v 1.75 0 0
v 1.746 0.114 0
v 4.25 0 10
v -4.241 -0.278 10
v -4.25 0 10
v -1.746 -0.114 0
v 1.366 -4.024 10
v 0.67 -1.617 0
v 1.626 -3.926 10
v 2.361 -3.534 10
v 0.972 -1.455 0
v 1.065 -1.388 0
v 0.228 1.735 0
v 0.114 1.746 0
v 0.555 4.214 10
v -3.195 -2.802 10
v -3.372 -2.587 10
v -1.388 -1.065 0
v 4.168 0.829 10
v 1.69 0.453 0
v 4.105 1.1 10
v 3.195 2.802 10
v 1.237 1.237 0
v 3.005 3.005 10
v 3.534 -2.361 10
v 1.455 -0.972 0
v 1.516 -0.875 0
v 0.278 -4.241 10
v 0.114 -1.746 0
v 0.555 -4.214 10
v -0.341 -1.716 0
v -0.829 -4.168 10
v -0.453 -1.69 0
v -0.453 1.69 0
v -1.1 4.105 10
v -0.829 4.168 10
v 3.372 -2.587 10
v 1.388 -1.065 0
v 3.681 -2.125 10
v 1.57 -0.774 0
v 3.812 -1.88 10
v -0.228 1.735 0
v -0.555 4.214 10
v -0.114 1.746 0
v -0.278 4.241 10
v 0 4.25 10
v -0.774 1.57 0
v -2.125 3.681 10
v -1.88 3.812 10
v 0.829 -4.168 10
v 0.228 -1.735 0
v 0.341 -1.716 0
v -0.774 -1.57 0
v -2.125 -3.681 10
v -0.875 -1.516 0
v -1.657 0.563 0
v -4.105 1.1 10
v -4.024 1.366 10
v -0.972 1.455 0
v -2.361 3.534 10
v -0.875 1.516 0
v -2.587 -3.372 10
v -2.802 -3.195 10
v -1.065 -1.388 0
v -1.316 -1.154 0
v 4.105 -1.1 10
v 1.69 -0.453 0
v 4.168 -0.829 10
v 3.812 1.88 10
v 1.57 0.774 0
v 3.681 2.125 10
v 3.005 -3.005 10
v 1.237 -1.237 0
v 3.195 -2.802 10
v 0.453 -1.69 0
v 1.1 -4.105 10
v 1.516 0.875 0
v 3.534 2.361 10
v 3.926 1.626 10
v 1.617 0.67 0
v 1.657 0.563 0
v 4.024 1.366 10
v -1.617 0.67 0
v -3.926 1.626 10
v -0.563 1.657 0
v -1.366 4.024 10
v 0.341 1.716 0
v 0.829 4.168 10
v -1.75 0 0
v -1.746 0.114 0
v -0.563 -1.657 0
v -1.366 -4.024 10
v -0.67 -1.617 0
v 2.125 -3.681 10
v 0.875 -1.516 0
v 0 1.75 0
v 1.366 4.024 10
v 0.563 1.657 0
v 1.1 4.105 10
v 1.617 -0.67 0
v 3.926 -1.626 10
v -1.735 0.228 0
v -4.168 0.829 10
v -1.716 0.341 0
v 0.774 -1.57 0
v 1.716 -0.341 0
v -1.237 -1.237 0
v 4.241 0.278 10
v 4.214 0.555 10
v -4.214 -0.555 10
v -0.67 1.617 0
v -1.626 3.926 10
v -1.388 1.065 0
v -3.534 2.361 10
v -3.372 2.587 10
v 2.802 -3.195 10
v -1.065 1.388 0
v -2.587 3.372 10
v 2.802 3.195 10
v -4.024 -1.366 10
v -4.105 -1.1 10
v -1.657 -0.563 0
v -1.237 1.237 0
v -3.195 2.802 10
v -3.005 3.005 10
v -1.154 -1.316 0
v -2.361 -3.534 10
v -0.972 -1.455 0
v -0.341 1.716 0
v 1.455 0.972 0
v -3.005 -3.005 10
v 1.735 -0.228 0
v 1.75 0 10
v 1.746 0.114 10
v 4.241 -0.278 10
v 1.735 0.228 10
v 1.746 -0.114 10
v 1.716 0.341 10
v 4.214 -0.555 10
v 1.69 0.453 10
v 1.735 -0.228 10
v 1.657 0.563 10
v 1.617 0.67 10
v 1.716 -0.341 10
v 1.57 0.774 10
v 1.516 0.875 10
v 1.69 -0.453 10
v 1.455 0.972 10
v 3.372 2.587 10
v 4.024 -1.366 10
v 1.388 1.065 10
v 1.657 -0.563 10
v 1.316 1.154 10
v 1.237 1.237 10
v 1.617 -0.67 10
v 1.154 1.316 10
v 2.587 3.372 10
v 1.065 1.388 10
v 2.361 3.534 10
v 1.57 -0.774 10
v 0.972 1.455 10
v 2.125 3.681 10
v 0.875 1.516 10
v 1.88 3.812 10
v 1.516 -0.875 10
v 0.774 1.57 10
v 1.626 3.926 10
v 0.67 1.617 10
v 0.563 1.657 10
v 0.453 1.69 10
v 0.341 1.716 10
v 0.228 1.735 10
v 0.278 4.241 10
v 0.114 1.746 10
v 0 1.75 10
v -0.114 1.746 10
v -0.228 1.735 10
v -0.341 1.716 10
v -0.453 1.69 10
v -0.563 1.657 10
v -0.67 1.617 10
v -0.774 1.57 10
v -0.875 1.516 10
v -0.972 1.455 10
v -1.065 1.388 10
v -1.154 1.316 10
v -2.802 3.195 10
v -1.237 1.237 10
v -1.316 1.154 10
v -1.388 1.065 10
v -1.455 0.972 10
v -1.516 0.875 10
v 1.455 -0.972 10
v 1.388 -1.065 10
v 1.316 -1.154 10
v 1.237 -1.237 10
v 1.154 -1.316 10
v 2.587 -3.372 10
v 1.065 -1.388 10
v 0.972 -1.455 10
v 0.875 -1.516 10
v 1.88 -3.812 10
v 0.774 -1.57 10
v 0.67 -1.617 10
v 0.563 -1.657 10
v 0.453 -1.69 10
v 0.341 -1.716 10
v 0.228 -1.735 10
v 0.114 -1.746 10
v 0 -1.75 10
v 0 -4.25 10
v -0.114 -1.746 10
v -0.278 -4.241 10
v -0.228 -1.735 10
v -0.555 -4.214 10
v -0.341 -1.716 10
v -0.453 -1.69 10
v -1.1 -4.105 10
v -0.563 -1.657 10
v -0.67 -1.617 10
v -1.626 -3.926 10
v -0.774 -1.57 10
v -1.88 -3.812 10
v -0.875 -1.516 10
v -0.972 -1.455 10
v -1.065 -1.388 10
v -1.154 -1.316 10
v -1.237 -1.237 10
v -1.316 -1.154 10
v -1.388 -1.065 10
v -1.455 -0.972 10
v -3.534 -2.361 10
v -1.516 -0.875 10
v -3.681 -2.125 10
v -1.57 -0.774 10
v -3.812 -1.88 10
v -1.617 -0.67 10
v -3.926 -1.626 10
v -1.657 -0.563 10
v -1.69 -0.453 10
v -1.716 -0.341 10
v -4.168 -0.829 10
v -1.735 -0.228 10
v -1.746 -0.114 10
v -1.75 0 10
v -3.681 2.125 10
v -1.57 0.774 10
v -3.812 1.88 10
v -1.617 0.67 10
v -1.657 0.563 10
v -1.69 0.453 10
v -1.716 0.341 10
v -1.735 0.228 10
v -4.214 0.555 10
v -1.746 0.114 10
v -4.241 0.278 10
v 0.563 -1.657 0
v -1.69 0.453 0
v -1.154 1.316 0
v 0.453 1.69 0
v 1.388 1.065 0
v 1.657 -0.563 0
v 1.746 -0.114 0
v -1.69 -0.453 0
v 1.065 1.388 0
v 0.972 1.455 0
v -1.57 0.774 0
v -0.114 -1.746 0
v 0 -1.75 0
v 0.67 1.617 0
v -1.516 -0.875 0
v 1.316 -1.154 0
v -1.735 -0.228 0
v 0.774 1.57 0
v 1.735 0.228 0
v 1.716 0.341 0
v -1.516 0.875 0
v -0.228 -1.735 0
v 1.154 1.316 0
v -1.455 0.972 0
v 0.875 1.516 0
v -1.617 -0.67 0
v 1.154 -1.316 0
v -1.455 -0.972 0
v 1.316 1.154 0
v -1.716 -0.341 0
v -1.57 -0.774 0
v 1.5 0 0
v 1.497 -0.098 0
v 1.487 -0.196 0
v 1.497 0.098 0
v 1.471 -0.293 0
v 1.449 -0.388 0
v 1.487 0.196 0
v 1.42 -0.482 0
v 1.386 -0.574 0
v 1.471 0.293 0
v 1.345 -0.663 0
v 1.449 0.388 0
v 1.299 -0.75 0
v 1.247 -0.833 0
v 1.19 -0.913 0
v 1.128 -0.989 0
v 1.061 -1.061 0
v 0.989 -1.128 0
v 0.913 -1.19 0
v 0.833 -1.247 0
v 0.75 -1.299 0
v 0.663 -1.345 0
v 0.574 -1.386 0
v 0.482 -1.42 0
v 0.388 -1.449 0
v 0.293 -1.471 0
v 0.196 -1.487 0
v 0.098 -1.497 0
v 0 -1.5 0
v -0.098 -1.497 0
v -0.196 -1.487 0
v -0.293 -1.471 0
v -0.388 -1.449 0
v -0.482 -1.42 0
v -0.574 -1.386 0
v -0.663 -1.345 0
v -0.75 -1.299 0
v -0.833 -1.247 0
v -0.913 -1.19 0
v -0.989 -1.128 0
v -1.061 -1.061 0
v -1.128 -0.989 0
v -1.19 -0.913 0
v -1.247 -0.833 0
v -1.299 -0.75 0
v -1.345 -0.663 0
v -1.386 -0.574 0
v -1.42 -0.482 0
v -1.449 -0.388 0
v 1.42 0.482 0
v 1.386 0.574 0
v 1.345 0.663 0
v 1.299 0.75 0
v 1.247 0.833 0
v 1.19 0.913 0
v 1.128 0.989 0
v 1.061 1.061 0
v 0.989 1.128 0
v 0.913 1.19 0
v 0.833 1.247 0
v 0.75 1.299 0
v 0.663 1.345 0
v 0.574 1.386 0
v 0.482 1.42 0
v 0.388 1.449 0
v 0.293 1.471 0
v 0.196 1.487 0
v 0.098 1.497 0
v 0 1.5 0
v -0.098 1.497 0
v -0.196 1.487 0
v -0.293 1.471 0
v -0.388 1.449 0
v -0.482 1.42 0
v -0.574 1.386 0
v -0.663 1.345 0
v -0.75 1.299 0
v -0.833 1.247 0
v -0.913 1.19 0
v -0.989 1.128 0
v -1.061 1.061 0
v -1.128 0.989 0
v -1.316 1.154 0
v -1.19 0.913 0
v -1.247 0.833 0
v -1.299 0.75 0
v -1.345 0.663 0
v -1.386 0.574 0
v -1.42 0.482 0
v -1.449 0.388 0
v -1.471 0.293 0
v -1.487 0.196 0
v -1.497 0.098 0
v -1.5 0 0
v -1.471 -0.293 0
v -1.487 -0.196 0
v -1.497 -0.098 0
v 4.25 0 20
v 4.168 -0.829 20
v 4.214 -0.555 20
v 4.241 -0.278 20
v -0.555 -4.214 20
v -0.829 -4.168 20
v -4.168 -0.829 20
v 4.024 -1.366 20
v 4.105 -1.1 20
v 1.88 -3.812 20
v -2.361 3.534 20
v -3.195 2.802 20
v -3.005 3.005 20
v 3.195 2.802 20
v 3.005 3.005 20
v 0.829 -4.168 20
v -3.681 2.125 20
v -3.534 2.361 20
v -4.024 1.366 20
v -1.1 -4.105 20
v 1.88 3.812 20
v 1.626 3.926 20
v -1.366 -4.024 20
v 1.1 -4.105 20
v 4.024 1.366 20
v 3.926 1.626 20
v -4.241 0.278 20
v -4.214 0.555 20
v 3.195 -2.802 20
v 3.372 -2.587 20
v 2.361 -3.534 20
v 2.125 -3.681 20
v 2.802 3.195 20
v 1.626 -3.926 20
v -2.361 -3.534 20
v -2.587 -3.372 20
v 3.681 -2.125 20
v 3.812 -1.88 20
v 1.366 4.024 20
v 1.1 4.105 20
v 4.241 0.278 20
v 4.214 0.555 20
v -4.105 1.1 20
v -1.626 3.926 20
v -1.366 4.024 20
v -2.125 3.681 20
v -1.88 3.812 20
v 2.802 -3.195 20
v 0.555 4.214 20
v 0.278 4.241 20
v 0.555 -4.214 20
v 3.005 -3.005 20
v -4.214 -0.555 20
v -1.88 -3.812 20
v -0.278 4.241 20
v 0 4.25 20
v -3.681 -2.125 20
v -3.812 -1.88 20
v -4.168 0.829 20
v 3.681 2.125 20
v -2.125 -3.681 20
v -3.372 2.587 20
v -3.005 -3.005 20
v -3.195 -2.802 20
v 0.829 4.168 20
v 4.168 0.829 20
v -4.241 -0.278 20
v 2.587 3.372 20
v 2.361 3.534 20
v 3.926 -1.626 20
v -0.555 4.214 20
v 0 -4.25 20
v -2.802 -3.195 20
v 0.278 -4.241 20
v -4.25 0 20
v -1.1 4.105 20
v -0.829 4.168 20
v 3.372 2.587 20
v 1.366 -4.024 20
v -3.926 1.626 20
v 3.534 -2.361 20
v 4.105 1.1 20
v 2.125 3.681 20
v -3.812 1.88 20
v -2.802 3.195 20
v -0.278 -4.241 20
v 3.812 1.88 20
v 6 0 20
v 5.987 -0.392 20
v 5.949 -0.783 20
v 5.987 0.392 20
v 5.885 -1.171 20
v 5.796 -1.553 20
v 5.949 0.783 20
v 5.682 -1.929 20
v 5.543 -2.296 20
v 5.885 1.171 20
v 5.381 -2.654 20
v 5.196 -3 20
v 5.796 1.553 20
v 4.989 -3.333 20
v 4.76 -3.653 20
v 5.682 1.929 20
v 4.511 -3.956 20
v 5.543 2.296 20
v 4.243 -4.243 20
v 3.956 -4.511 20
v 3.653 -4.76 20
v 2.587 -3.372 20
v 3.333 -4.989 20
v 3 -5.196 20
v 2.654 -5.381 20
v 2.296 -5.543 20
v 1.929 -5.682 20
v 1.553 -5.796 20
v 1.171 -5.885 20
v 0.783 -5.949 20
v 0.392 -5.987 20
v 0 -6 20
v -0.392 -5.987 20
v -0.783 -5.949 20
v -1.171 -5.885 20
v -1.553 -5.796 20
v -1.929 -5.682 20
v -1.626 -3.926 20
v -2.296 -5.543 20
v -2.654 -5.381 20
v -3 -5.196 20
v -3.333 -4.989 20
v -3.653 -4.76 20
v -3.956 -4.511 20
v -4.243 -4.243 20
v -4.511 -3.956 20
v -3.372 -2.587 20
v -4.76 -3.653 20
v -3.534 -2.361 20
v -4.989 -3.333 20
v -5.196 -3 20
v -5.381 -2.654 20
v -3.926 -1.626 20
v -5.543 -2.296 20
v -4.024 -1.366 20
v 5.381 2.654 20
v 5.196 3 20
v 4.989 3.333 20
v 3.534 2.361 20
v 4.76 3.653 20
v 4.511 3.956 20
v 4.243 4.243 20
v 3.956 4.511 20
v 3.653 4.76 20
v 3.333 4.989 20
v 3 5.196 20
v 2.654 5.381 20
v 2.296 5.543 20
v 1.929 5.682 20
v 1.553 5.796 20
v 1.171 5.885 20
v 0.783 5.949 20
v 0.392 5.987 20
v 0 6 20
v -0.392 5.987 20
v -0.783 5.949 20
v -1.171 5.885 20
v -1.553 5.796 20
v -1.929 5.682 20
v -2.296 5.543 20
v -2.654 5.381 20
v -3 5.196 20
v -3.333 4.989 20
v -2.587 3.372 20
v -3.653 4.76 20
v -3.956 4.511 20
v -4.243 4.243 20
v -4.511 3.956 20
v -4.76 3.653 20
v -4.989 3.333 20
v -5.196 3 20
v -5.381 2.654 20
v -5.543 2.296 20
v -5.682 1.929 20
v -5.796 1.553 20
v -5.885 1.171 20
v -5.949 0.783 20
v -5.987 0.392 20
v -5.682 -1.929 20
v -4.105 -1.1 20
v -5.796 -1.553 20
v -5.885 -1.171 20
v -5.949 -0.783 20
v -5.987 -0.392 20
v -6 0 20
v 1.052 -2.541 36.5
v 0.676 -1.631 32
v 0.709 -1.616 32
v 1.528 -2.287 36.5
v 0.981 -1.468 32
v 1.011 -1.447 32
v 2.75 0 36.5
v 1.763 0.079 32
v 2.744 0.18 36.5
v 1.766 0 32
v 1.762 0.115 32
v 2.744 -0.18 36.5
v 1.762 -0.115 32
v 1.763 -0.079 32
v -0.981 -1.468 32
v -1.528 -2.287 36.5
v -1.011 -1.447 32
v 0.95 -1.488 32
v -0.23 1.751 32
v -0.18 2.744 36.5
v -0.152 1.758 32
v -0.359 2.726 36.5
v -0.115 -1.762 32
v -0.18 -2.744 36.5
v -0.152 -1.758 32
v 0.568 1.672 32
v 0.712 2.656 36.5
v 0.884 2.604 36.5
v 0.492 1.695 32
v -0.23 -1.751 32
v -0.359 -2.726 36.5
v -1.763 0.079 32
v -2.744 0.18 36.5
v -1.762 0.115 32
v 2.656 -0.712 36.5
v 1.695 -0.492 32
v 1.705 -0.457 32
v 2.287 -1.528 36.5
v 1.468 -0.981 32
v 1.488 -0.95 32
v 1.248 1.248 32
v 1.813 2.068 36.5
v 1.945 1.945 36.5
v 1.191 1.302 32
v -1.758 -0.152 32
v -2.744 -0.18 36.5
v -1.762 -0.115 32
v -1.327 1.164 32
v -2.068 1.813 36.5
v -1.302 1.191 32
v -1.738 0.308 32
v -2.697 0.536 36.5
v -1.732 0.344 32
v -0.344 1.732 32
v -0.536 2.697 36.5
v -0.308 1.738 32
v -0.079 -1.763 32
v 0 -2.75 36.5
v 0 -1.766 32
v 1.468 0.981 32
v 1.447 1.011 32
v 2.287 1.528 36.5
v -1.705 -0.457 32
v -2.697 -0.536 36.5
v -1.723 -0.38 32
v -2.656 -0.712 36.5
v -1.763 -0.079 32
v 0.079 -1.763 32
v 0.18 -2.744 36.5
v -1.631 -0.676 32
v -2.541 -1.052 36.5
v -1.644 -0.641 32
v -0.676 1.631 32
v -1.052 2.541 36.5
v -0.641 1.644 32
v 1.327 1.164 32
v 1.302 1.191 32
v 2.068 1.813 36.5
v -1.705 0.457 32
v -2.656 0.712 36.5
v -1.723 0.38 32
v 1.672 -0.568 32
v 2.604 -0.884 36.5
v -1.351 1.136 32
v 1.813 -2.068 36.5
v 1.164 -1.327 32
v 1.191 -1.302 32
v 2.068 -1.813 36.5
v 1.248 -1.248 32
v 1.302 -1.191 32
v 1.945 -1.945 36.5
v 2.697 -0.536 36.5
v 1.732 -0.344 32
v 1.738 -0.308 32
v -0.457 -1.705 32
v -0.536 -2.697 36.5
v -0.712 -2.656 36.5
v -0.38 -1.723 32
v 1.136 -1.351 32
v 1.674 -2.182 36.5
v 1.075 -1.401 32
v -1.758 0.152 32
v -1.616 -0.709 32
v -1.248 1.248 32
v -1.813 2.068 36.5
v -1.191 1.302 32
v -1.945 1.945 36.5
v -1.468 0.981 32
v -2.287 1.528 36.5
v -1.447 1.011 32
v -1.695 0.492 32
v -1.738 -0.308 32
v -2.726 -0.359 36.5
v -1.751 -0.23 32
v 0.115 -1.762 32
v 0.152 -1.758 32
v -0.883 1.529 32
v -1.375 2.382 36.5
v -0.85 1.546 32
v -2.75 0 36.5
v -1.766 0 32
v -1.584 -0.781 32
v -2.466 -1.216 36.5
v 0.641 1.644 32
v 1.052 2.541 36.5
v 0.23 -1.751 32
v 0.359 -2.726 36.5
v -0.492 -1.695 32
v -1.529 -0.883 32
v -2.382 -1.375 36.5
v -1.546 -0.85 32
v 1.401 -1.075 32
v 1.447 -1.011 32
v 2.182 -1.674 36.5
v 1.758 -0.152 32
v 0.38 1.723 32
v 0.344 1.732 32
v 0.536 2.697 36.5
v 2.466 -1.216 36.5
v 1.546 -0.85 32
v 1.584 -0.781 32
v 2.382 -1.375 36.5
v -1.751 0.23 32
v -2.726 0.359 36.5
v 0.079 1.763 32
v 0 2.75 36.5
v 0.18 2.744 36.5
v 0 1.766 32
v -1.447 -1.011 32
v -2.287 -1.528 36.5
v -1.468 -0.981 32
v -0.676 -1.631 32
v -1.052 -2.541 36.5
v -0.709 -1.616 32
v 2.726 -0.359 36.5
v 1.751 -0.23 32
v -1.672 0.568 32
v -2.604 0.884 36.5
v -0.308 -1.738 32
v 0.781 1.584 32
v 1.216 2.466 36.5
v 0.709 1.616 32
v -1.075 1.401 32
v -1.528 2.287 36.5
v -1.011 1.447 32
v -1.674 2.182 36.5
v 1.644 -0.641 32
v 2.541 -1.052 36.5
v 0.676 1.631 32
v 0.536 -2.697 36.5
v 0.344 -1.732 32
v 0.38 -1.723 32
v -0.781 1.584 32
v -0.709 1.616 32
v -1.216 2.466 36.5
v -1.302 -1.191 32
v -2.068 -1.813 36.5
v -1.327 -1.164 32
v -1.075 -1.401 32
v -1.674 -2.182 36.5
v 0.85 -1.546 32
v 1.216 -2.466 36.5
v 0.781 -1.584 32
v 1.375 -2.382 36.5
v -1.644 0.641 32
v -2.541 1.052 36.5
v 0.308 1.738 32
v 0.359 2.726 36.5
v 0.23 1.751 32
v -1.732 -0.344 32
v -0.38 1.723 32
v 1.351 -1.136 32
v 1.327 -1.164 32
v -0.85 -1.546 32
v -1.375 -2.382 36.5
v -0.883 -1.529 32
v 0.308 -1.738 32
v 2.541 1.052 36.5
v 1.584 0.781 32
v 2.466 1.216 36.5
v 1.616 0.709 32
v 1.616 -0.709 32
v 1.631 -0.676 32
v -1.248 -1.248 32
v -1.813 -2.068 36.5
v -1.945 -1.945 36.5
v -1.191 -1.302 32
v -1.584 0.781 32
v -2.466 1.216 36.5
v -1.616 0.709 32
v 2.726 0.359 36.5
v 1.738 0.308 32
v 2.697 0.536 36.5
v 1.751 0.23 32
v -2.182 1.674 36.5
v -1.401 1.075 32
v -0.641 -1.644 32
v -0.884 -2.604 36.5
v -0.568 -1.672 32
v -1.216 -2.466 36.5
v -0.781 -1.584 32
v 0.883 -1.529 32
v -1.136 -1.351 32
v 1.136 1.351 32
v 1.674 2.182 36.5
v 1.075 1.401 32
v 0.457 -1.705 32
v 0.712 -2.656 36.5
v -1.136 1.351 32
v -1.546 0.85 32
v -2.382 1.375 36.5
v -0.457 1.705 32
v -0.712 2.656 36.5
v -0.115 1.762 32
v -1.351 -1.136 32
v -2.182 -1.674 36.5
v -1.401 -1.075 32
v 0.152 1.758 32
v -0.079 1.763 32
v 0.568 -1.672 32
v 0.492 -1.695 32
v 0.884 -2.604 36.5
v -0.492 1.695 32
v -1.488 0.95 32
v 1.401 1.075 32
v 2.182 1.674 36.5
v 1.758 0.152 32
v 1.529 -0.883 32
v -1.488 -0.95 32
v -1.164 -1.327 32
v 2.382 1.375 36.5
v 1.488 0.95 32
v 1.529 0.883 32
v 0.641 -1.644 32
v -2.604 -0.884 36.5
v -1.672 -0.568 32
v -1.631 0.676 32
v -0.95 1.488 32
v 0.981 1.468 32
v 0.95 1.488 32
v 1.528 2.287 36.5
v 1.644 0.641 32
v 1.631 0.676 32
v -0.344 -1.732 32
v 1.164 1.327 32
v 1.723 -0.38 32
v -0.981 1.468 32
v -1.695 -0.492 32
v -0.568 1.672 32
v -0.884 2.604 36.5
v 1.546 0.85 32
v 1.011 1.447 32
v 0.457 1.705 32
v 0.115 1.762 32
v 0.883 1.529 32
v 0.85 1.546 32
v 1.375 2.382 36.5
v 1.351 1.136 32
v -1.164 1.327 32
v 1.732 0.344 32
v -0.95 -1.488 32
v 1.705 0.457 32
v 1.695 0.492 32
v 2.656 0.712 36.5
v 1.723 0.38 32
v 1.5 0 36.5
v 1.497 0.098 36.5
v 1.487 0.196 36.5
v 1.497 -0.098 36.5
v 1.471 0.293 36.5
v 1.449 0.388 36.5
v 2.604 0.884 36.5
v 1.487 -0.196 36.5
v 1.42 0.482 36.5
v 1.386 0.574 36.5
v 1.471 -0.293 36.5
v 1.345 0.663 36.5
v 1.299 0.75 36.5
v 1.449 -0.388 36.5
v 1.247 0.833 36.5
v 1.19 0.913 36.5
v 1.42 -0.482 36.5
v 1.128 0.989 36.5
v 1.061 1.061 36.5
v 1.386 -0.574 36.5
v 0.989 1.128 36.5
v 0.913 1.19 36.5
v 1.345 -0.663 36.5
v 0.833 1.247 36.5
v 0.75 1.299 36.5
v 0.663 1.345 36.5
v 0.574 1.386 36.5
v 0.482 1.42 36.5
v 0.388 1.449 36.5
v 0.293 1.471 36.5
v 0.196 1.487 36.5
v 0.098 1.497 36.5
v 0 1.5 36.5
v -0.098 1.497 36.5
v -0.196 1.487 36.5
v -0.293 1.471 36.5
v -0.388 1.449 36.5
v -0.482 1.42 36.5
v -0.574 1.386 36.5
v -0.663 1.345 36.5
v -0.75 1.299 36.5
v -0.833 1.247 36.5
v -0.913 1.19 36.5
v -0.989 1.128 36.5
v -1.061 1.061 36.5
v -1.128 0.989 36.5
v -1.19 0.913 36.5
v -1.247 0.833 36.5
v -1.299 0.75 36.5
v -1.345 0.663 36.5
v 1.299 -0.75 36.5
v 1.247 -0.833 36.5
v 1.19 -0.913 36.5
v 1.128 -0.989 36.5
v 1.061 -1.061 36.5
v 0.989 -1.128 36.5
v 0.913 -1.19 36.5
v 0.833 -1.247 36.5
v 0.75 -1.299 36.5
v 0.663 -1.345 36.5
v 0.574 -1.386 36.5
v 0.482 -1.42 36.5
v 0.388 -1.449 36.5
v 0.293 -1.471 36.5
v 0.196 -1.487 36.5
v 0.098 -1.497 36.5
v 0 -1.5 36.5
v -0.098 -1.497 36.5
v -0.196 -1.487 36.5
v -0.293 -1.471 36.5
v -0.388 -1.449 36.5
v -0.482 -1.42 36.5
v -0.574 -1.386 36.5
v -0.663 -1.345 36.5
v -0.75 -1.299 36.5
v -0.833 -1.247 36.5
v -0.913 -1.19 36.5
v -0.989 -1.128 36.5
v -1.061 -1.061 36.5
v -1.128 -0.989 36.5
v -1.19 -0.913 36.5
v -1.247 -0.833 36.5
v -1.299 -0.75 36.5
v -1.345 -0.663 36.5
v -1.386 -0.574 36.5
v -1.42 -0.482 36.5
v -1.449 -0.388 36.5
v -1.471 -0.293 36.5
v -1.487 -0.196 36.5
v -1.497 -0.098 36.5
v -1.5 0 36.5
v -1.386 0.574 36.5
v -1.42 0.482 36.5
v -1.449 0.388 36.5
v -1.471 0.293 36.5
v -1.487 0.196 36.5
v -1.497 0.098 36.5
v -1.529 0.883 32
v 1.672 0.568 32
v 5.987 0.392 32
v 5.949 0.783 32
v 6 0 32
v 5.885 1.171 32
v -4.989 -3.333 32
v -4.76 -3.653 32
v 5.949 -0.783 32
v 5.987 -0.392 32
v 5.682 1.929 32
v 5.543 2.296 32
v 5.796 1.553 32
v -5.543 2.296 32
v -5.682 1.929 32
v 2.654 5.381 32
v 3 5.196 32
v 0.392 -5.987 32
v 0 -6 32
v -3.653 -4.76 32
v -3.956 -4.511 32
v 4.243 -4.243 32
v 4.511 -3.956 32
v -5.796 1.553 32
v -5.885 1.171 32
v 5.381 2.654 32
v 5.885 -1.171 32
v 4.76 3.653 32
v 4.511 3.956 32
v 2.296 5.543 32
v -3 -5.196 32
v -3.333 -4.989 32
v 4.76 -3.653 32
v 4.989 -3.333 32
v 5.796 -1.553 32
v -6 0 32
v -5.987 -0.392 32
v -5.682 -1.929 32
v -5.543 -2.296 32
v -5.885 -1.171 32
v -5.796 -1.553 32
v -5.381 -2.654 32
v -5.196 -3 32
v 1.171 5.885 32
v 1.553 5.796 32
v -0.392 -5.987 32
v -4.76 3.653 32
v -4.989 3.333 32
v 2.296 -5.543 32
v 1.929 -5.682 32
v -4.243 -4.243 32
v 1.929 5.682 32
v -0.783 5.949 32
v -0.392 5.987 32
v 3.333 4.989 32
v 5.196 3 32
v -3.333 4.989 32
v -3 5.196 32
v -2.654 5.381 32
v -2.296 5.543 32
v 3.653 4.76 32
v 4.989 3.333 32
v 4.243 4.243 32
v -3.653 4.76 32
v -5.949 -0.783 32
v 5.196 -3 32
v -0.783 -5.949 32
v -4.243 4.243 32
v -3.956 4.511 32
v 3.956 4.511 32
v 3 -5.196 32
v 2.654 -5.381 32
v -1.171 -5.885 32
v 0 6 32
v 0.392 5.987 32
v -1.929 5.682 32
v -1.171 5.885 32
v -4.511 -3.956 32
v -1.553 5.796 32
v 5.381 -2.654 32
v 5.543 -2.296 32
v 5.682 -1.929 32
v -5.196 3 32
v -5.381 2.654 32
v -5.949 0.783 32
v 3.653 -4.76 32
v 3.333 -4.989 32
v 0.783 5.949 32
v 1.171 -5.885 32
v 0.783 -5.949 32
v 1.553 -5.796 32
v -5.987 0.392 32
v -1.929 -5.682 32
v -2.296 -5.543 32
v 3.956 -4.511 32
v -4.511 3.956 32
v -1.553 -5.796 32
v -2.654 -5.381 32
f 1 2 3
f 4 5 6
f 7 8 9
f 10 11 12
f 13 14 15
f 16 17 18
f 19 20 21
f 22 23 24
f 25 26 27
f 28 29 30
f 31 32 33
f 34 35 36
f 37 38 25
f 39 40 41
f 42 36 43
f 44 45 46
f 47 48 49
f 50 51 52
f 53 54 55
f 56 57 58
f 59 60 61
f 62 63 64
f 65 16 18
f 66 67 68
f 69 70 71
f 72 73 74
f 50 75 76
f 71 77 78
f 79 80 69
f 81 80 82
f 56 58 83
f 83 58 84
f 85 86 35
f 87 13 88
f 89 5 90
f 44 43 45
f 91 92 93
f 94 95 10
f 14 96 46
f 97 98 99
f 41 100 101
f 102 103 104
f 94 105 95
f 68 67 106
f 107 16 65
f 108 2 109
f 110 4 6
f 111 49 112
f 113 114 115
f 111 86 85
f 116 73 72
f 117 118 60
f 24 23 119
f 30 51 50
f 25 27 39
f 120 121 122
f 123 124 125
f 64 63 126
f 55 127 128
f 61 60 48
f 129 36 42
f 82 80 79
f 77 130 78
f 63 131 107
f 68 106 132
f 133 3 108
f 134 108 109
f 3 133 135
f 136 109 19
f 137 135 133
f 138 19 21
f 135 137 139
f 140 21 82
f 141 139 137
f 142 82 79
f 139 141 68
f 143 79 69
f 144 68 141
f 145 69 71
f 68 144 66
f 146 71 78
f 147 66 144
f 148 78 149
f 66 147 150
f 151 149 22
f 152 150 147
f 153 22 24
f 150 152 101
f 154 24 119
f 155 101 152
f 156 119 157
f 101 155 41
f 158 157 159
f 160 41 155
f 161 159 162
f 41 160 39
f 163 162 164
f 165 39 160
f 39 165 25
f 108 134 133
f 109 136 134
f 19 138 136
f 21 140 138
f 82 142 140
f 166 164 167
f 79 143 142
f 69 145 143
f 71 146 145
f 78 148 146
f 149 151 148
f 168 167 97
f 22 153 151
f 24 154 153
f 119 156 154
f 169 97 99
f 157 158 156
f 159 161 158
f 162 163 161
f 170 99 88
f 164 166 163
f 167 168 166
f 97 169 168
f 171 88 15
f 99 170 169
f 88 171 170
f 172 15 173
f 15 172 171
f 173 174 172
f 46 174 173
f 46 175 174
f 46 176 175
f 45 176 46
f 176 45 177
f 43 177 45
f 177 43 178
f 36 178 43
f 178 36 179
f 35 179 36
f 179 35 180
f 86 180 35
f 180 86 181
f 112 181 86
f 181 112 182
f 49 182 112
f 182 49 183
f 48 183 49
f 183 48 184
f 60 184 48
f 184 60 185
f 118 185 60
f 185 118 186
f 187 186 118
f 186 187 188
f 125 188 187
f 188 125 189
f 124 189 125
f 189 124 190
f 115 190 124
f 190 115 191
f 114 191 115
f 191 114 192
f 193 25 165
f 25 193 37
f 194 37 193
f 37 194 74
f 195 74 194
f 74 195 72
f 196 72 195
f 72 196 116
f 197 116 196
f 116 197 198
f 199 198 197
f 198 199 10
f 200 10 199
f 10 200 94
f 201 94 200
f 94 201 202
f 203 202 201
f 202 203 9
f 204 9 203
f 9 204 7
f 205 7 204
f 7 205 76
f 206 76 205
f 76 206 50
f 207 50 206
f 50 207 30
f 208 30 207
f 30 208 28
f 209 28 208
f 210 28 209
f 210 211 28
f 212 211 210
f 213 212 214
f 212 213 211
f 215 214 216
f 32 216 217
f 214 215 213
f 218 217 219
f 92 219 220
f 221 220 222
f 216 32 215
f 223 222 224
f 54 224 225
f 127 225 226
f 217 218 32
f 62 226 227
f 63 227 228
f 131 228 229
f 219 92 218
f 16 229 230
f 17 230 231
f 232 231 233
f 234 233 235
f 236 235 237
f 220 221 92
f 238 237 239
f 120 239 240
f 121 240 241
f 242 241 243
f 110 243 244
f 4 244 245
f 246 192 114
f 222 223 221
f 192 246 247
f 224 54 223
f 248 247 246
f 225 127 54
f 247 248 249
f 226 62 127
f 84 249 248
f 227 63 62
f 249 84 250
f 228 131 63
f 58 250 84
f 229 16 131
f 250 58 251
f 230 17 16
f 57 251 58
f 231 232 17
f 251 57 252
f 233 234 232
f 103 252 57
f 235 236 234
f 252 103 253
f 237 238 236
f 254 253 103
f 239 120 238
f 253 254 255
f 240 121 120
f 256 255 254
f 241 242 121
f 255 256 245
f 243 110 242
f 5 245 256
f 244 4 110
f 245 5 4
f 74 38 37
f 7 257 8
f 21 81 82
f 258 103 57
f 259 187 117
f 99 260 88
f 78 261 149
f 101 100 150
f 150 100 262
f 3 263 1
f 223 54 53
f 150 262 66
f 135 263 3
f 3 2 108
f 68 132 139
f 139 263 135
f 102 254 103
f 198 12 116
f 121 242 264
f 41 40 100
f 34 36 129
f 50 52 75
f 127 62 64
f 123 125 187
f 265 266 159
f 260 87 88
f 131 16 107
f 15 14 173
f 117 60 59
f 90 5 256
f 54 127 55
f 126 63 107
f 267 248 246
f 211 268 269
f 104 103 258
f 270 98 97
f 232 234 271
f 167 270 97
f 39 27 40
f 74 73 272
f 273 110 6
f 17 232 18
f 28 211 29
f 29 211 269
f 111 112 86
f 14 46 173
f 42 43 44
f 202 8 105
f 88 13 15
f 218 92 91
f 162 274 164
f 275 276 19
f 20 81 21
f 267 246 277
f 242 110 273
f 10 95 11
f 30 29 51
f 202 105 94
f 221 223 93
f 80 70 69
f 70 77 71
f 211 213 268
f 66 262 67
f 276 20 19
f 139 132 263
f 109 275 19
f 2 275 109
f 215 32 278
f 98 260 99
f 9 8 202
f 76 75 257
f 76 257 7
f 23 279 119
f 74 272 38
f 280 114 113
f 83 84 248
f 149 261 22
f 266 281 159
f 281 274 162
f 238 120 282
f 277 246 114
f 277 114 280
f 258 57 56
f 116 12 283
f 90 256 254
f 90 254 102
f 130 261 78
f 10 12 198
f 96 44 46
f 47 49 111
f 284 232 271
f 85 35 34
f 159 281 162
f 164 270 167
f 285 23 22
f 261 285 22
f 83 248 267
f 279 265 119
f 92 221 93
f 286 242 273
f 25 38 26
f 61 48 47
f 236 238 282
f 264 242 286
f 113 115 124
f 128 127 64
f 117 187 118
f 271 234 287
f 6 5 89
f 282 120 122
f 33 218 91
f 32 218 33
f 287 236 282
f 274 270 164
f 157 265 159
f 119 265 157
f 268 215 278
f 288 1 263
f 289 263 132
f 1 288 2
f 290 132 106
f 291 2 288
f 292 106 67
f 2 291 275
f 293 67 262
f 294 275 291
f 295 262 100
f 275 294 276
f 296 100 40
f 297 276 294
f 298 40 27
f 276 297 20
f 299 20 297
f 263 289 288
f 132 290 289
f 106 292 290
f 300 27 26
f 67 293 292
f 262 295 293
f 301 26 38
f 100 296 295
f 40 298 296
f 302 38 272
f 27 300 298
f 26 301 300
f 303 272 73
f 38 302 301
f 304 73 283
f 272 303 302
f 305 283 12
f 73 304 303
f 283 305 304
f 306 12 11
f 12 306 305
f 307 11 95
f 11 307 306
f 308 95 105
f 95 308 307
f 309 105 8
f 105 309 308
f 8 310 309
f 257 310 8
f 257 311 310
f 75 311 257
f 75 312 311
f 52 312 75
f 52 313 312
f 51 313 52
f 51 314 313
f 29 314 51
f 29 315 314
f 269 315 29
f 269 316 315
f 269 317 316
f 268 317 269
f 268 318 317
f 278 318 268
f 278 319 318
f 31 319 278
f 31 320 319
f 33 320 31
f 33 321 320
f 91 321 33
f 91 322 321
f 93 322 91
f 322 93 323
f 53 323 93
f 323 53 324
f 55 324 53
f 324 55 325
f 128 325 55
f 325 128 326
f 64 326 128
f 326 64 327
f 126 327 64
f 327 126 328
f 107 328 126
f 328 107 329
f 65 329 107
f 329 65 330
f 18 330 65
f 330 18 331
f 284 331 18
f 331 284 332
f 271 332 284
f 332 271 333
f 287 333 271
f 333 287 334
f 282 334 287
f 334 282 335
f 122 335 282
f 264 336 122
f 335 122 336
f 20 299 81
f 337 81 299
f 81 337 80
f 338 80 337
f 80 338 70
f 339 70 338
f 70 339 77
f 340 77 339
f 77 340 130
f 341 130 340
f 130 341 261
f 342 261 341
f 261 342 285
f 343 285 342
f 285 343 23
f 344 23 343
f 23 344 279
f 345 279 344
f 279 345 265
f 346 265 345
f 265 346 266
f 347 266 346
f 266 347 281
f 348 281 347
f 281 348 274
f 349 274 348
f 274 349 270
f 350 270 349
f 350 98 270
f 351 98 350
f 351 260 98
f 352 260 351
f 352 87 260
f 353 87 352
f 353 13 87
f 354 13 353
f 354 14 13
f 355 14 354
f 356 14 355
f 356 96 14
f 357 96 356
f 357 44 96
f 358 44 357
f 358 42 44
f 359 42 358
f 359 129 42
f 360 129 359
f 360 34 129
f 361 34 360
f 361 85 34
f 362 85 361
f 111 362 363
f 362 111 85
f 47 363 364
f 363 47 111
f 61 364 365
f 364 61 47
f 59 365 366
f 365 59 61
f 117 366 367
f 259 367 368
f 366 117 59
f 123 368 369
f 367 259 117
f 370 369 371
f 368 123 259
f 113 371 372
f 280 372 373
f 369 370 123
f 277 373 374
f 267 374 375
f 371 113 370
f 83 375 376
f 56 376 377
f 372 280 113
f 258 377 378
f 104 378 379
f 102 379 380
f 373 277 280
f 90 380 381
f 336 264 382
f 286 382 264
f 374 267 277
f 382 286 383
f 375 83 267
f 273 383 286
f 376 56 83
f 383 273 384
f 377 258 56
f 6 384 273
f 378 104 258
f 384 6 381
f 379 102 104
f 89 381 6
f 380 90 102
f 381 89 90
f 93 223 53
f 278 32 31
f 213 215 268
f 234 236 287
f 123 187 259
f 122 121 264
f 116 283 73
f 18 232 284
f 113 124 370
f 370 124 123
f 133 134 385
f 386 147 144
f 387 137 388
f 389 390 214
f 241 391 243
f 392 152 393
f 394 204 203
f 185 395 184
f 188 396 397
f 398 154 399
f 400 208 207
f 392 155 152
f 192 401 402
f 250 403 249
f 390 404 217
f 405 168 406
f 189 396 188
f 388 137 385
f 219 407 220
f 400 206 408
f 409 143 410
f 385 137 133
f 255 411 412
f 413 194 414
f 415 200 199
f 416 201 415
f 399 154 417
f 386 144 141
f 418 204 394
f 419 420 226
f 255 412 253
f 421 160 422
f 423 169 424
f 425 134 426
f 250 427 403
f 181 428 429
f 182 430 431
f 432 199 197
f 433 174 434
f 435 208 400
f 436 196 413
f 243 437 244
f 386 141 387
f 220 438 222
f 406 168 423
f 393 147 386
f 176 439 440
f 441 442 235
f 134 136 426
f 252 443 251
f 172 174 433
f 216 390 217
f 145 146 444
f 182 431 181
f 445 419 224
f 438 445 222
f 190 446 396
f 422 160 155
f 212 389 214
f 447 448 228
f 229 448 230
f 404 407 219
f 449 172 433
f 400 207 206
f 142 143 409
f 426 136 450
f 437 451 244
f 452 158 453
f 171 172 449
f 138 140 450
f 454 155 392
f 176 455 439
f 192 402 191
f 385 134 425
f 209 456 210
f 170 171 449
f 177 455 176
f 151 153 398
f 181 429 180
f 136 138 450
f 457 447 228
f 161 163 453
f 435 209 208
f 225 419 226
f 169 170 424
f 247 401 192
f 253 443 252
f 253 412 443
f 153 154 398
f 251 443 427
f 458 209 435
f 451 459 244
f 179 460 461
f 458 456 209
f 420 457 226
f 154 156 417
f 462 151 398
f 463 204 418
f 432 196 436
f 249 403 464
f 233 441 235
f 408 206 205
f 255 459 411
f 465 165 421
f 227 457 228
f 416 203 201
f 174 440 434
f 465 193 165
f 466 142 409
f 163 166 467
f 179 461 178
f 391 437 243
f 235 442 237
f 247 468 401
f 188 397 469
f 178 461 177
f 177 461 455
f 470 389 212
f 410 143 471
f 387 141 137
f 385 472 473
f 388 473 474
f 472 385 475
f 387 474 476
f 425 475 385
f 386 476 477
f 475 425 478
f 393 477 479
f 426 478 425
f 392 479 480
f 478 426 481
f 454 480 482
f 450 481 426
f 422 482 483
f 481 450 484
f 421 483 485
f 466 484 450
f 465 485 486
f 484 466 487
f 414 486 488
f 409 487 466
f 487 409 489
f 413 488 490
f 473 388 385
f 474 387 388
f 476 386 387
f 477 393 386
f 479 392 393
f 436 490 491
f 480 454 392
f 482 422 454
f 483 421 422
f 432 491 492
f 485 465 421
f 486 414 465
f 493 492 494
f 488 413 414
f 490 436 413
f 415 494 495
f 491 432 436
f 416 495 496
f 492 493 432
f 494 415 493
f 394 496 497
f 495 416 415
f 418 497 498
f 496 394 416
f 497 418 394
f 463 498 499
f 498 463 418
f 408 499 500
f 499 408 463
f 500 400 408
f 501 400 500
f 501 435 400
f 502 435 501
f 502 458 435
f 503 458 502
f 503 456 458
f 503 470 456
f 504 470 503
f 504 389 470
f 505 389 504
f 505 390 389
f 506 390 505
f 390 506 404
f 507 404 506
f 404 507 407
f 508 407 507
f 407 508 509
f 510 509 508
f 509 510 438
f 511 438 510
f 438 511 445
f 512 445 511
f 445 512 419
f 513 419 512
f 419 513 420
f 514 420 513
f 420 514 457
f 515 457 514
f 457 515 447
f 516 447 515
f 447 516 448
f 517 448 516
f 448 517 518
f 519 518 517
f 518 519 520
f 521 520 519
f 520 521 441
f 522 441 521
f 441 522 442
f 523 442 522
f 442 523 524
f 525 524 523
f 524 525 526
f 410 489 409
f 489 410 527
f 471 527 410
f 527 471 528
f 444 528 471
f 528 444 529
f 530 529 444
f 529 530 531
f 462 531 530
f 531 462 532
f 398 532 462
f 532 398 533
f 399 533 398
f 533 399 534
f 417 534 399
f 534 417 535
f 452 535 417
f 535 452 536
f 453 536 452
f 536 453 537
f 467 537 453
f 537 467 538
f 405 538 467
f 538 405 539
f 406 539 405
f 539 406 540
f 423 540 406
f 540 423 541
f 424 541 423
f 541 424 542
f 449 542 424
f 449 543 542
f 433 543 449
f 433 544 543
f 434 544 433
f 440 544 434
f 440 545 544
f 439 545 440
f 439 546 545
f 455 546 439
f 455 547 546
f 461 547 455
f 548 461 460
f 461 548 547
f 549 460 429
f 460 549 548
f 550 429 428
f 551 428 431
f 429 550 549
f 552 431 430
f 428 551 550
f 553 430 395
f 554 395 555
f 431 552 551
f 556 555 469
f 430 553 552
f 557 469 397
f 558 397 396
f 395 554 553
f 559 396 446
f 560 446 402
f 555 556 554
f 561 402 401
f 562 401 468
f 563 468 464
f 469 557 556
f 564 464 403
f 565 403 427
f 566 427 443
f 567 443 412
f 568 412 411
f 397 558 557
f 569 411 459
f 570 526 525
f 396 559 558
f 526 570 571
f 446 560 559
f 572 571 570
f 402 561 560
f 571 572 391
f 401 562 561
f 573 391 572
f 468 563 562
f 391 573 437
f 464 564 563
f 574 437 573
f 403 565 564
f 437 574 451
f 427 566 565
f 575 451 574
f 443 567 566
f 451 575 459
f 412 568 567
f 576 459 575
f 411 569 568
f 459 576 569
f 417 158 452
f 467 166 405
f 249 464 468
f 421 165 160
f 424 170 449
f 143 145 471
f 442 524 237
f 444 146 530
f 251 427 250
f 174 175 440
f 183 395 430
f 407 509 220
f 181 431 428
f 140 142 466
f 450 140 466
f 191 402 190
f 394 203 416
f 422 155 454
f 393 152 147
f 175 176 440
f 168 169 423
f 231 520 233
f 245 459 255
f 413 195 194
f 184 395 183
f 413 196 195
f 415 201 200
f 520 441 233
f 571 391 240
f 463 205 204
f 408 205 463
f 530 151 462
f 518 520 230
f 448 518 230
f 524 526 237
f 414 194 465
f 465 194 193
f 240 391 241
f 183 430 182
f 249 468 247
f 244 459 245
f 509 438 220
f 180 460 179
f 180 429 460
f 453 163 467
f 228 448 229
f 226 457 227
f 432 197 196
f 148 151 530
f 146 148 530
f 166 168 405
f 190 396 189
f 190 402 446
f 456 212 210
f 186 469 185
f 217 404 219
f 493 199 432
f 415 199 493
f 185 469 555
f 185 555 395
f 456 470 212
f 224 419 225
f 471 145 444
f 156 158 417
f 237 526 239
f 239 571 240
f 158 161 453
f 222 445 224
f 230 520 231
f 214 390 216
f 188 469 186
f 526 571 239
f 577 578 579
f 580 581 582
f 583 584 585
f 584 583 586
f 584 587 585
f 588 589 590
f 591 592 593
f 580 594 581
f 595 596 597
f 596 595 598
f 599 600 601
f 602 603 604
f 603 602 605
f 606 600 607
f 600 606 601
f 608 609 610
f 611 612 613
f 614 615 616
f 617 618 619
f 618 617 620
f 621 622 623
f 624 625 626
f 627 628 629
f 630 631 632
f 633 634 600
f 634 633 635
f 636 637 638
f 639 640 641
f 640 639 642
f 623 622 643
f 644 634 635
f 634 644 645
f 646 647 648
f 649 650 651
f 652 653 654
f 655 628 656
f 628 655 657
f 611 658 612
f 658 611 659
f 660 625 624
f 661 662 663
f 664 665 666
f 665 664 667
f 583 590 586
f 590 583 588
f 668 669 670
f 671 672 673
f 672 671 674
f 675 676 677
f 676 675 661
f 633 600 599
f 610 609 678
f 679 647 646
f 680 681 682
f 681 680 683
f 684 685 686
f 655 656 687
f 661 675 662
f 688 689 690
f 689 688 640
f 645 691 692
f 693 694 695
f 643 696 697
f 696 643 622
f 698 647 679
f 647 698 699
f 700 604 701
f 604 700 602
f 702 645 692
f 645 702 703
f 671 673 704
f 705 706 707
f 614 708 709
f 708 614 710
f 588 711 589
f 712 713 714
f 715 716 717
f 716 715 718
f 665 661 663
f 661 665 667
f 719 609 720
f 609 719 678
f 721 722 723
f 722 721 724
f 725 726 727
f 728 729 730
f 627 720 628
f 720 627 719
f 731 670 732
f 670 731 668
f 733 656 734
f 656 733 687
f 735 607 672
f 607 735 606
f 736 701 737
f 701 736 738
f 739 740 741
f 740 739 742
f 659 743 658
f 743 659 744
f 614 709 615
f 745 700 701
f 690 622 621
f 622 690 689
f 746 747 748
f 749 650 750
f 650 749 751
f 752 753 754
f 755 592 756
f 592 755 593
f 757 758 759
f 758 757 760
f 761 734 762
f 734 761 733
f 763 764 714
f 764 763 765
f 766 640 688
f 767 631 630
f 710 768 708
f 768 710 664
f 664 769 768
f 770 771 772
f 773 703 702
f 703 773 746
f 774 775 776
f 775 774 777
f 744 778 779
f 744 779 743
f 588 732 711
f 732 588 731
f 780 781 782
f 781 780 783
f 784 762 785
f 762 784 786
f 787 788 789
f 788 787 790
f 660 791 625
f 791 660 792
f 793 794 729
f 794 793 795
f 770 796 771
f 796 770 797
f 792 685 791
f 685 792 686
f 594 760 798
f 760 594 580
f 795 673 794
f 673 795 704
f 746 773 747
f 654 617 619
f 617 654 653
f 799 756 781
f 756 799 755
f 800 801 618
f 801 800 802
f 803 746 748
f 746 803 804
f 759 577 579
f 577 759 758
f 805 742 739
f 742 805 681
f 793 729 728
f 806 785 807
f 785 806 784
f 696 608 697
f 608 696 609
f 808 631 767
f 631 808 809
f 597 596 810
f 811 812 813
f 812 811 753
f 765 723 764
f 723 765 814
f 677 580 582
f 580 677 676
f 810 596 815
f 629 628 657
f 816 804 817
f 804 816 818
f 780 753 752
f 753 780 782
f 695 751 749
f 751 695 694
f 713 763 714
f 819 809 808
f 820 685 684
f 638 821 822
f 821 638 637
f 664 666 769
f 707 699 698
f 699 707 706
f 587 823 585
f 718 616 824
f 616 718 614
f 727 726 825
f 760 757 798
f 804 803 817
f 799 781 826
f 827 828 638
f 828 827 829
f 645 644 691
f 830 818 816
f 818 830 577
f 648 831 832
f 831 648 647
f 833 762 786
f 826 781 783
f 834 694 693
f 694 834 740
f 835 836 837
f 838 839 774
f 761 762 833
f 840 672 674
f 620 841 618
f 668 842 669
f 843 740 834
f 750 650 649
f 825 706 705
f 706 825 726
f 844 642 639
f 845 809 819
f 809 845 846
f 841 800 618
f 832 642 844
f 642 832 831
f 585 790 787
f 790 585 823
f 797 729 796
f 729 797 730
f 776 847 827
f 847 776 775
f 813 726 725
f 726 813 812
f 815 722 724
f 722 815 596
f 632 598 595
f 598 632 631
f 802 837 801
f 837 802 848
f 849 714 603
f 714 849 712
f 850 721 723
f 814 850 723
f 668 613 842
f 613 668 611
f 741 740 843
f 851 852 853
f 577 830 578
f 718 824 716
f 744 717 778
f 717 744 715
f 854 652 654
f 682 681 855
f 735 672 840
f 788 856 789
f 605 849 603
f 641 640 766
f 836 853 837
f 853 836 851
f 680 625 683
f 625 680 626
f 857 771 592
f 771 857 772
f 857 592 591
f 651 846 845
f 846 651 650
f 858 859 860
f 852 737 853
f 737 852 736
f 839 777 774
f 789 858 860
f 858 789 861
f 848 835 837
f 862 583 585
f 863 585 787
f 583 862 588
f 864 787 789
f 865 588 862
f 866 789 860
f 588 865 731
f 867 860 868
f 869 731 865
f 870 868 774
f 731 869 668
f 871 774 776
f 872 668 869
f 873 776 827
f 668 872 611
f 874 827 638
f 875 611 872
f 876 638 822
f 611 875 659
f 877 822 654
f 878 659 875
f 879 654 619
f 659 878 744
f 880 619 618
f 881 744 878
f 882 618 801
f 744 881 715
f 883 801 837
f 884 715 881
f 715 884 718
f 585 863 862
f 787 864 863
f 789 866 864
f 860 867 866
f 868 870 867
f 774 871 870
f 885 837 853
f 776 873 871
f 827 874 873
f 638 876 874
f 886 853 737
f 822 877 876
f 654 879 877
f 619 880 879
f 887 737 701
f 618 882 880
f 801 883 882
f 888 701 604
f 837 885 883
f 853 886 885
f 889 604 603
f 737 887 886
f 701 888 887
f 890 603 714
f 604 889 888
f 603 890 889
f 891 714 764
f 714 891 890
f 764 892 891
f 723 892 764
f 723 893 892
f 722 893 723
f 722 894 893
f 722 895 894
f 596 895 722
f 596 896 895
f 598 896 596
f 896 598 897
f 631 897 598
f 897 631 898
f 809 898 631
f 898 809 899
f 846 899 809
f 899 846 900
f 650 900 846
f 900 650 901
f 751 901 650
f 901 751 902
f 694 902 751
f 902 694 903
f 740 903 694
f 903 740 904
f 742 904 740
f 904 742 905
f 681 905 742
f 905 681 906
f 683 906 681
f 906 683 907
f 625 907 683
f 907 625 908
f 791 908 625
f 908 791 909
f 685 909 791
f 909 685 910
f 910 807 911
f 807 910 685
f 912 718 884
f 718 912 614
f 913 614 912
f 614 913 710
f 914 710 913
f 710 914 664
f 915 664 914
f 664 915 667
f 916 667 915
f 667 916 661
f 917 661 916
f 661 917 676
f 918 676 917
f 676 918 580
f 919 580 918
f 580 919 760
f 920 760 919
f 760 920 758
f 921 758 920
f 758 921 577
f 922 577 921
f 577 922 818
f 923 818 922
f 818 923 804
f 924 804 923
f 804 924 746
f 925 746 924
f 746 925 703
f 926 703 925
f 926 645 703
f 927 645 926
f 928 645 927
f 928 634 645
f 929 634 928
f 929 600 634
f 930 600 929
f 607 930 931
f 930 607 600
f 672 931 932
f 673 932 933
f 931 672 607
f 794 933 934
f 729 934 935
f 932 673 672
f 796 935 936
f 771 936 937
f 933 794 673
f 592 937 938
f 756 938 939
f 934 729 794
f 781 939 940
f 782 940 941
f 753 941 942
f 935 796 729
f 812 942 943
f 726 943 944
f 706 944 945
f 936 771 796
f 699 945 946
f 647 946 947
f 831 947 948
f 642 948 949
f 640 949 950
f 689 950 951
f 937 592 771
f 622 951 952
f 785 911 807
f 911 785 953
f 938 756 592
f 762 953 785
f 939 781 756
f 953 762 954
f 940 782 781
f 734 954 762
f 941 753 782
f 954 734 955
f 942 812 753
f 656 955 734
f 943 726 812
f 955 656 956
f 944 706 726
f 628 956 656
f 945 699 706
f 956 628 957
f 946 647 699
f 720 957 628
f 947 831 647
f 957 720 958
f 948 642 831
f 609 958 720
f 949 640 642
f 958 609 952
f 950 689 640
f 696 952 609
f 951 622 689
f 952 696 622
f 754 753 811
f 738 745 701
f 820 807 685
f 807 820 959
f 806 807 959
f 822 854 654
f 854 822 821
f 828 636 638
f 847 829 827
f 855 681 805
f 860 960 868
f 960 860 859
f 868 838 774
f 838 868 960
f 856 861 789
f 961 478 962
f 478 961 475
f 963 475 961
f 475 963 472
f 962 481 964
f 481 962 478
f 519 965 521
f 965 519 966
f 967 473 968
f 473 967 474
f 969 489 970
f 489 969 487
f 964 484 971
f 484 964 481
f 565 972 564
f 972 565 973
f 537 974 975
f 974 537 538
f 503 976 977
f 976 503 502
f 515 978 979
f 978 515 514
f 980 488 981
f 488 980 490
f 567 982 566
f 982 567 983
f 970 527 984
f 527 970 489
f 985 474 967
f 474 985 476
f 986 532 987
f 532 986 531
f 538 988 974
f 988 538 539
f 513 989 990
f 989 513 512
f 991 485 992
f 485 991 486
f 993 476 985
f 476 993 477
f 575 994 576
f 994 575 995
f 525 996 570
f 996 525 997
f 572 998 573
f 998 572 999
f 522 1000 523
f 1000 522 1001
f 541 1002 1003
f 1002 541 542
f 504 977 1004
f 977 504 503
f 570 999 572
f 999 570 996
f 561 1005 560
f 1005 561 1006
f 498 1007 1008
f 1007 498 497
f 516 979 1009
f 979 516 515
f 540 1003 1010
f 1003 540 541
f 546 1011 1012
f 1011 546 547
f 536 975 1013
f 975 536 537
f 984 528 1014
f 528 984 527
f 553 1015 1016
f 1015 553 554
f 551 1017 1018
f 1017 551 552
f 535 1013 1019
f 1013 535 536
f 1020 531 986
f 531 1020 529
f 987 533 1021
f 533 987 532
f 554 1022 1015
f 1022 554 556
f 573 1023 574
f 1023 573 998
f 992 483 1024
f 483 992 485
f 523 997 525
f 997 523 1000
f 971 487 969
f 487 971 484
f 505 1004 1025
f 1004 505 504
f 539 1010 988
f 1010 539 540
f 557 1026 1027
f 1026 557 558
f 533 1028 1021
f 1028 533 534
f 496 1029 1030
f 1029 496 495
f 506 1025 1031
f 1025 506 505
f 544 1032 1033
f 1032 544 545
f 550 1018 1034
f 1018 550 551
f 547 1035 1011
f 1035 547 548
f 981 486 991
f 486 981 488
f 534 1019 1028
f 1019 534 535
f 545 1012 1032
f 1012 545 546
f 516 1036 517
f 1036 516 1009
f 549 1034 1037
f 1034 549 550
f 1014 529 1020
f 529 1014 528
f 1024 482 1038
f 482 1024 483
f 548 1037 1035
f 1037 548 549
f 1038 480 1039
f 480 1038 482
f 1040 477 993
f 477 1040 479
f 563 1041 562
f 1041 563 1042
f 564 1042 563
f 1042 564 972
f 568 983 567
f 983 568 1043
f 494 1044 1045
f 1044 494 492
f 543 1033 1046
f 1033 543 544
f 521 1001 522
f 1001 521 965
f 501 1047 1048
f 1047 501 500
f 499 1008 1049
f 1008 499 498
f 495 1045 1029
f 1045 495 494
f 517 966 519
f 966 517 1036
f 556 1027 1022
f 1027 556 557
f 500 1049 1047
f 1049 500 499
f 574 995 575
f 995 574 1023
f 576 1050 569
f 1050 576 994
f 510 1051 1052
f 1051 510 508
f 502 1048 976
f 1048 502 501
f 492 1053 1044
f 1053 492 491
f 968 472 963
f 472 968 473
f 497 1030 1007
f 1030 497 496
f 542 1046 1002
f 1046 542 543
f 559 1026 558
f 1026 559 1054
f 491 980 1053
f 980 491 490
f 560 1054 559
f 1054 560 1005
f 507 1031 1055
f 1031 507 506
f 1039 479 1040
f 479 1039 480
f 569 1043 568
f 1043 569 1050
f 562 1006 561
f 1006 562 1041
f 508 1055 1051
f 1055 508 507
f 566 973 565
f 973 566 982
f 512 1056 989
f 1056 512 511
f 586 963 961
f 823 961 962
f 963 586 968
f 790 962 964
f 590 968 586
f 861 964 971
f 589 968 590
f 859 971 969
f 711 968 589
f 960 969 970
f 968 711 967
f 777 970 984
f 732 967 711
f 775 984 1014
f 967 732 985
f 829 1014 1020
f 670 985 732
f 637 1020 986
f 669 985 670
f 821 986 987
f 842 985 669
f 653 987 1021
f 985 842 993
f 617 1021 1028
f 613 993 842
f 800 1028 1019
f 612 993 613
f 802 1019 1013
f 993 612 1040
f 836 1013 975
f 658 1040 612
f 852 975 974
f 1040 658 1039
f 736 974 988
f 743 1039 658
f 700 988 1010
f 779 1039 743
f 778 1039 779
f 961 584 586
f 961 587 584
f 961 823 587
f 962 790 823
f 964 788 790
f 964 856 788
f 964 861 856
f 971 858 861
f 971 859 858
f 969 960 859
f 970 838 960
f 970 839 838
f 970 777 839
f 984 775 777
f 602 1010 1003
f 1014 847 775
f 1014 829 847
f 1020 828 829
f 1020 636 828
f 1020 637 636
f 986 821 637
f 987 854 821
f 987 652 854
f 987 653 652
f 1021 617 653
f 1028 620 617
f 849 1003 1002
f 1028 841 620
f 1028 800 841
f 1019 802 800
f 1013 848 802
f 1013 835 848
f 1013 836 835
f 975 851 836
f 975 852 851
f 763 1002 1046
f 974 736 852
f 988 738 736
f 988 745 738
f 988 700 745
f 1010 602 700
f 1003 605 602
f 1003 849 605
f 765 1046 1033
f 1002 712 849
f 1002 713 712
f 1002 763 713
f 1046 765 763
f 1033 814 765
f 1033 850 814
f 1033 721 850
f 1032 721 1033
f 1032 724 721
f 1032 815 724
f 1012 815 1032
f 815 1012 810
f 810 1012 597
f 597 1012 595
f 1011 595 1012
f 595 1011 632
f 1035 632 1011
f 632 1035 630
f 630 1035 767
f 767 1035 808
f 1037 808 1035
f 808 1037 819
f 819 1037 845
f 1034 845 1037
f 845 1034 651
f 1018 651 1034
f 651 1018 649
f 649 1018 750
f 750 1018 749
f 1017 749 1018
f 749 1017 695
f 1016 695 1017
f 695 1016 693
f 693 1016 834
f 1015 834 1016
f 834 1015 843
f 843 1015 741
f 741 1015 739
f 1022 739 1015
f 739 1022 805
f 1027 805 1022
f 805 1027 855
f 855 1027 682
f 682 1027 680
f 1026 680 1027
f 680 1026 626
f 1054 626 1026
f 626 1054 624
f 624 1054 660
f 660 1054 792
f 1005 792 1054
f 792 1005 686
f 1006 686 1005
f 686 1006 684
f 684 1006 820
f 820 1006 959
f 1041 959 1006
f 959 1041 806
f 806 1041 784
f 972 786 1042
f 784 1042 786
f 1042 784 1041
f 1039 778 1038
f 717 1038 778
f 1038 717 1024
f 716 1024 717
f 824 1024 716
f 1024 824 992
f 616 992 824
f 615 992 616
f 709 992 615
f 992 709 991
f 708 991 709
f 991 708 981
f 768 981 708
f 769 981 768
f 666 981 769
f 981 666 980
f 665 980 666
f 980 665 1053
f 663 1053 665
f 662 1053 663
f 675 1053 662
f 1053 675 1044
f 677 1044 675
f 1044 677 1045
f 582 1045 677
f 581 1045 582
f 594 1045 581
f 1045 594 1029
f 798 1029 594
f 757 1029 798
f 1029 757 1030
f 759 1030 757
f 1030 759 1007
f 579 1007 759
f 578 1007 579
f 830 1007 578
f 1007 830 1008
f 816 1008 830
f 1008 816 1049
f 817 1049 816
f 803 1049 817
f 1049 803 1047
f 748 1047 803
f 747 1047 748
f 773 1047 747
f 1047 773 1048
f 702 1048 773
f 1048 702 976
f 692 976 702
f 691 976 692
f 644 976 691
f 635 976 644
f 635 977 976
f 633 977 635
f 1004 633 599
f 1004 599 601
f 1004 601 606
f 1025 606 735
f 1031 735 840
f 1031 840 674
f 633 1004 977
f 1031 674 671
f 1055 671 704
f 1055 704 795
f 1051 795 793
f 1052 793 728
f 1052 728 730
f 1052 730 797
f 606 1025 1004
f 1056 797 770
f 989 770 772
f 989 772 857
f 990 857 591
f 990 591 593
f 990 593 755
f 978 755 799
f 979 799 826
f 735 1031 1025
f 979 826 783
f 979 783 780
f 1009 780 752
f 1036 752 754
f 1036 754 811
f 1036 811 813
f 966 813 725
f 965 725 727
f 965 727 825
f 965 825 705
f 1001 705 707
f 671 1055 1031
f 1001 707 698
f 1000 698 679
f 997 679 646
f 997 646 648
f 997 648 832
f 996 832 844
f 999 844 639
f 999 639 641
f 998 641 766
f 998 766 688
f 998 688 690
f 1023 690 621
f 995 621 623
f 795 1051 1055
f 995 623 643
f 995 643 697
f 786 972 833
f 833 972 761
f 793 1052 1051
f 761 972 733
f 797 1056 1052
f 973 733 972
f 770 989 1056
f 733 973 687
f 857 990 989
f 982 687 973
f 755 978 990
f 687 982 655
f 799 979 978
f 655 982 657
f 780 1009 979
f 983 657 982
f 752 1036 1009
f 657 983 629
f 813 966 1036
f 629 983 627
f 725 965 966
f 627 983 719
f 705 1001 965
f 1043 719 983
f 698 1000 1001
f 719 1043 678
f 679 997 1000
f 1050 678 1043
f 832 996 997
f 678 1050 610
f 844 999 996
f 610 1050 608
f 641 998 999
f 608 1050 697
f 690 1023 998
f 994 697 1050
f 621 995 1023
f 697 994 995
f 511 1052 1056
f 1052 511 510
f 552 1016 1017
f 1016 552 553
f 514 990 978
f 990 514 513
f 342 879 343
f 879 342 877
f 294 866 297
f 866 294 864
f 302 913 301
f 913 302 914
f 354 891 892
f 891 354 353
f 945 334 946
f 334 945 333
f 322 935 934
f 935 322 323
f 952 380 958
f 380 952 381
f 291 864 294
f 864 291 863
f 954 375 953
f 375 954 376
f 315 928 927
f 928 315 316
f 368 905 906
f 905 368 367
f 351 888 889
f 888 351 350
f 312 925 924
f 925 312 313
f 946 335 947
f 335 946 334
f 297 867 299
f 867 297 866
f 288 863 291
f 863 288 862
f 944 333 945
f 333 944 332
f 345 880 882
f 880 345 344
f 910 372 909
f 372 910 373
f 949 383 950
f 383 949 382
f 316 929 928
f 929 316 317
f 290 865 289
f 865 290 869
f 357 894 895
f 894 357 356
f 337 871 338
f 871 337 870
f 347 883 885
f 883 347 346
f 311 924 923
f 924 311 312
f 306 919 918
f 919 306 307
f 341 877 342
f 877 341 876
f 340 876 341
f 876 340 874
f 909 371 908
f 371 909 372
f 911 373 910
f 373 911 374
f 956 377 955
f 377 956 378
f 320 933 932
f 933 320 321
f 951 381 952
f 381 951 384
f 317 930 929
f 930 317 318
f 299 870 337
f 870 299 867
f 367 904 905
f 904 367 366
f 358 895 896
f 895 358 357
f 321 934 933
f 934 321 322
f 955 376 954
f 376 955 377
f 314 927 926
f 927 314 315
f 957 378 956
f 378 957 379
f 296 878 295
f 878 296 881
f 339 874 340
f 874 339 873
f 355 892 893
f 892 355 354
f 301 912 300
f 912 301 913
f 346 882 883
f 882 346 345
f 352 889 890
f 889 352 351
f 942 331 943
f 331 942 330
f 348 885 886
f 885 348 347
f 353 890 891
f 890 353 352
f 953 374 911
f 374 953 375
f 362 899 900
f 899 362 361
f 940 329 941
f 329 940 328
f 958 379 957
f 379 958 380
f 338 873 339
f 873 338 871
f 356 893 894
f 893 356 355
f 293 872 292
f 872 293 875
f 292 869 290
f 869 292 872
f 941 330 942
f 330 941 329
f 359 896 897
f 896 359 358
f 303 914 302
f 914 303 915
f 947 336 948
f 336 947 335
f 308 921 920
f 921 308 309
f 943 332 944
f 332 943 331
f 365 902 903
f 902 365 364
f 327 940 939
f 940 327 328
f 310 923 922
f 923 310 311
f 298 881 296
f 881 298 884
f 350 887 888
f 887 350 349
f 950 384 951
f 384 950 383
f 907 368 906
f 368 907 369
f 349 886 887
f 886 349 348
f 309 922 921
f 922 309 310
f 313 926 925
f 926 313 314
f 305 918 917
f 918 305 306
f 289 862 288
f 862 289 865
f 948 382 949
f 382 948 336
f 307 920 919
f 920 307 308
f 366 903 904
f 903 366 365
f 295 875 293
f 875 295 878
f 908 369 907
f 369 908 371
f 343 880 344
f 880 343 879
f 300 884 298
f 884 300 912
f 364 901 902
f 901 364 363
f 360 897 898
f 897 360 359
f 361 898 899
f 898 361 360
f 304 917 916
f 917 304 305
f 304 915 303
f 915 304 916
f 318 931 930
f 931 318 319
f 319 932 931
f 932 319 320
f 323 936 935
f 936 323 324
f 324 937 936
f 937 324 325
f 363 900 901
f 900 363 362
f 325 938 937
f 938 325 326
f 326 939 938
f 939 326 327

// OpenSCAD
// Straight hose-barb reducer: 8 mm tubing (z = 0..20) -> 5 mm tubing (z = 25..41)
// Print orientation: standing upright along +Z, centred on the origin in X/Y.
// Units: mm. Bore: 3 mm through the full length.

// ---------------- Parameters ----------------
reducer_in_d     = 8;    // inlet tubing inner diameter
reducer_out_d    = 5;    // outlet tubing inner diameter
reducer_bore_d   = 3;    // through-bore diameter
reducer_barb_n   = 2;    // number of barbs per end (stacked)
reducer_len_in   = 20;   // inlet section length (z = 0..20)
reducer_len_out  = 16;   // outlet section length (z = 25..41)
reducer_collar_d = 12;   // collar diameter (z = 20..25)
reducer_overlap  = 0.5;  // overlap/step depth so adjacent shapes fuse cleanly

$fn = 96;                // curve resolution

// ---------------- Derived ----------------
in_r      = reducer_in_d / 2;      // 4.0 mm
out_r     = reducer_out_d / 2;     // 2.5 mm
collar_r  = reducer_collar_d / 2;  // 6.0 mm

// Barb radii at the key z positions (bottom -> top)
in_b_r0   = (in_r - reducer_overlap) / 2;   // bottom of inlet barbs
in_b_r1   = in_r + reducer_overlap / 2;     // top of inlet barbs
out_b_r0  = (out_r - reducer_overlap) / 2;  // bottom of outlet barbs
out_b_r1  = out_r + reducer_overlap / 2;    // top of outlet barbs

// ---------------- Model ----------------
difference() {
    union() {
        // Inlet barbs: z = 0..20
        for (i = [0 : reducer_barb_n - 1])
            translate([0, 0, i * reducer_len_in / reducer_barb_n])
                cylinder(h = reducer_len_in / reducer_barb_n,
                           r1 = in_b_r0, r2 = in_b_r1);

        // Collar: z = 20..25
        translate([0, 0, reducer_len_in])
            cylinder(h = reducer_collar_d, r = collar_r);

        // Outlet barbs: z = 25..41
        for (i = [0 : reducer_barb_n - 1])
            translate([0, 0, reducer_len_in + reducer_overlap + i * reducer_len_out / reducer_barb_n])
                cylinder(h = reducer_len_out / reducer_barb_n,
                           r1 = out_b_r0, r2 = out_b_r1);
    }

    // Through-bore: 3 mm diameter, full length (extends past top and bottom faces)
    translate([0, 0, -1])
        cylinder(h = reducer_len_in + reducer_collar_d + reducer_len_out + 2, d = reducer_bore_d);
}
